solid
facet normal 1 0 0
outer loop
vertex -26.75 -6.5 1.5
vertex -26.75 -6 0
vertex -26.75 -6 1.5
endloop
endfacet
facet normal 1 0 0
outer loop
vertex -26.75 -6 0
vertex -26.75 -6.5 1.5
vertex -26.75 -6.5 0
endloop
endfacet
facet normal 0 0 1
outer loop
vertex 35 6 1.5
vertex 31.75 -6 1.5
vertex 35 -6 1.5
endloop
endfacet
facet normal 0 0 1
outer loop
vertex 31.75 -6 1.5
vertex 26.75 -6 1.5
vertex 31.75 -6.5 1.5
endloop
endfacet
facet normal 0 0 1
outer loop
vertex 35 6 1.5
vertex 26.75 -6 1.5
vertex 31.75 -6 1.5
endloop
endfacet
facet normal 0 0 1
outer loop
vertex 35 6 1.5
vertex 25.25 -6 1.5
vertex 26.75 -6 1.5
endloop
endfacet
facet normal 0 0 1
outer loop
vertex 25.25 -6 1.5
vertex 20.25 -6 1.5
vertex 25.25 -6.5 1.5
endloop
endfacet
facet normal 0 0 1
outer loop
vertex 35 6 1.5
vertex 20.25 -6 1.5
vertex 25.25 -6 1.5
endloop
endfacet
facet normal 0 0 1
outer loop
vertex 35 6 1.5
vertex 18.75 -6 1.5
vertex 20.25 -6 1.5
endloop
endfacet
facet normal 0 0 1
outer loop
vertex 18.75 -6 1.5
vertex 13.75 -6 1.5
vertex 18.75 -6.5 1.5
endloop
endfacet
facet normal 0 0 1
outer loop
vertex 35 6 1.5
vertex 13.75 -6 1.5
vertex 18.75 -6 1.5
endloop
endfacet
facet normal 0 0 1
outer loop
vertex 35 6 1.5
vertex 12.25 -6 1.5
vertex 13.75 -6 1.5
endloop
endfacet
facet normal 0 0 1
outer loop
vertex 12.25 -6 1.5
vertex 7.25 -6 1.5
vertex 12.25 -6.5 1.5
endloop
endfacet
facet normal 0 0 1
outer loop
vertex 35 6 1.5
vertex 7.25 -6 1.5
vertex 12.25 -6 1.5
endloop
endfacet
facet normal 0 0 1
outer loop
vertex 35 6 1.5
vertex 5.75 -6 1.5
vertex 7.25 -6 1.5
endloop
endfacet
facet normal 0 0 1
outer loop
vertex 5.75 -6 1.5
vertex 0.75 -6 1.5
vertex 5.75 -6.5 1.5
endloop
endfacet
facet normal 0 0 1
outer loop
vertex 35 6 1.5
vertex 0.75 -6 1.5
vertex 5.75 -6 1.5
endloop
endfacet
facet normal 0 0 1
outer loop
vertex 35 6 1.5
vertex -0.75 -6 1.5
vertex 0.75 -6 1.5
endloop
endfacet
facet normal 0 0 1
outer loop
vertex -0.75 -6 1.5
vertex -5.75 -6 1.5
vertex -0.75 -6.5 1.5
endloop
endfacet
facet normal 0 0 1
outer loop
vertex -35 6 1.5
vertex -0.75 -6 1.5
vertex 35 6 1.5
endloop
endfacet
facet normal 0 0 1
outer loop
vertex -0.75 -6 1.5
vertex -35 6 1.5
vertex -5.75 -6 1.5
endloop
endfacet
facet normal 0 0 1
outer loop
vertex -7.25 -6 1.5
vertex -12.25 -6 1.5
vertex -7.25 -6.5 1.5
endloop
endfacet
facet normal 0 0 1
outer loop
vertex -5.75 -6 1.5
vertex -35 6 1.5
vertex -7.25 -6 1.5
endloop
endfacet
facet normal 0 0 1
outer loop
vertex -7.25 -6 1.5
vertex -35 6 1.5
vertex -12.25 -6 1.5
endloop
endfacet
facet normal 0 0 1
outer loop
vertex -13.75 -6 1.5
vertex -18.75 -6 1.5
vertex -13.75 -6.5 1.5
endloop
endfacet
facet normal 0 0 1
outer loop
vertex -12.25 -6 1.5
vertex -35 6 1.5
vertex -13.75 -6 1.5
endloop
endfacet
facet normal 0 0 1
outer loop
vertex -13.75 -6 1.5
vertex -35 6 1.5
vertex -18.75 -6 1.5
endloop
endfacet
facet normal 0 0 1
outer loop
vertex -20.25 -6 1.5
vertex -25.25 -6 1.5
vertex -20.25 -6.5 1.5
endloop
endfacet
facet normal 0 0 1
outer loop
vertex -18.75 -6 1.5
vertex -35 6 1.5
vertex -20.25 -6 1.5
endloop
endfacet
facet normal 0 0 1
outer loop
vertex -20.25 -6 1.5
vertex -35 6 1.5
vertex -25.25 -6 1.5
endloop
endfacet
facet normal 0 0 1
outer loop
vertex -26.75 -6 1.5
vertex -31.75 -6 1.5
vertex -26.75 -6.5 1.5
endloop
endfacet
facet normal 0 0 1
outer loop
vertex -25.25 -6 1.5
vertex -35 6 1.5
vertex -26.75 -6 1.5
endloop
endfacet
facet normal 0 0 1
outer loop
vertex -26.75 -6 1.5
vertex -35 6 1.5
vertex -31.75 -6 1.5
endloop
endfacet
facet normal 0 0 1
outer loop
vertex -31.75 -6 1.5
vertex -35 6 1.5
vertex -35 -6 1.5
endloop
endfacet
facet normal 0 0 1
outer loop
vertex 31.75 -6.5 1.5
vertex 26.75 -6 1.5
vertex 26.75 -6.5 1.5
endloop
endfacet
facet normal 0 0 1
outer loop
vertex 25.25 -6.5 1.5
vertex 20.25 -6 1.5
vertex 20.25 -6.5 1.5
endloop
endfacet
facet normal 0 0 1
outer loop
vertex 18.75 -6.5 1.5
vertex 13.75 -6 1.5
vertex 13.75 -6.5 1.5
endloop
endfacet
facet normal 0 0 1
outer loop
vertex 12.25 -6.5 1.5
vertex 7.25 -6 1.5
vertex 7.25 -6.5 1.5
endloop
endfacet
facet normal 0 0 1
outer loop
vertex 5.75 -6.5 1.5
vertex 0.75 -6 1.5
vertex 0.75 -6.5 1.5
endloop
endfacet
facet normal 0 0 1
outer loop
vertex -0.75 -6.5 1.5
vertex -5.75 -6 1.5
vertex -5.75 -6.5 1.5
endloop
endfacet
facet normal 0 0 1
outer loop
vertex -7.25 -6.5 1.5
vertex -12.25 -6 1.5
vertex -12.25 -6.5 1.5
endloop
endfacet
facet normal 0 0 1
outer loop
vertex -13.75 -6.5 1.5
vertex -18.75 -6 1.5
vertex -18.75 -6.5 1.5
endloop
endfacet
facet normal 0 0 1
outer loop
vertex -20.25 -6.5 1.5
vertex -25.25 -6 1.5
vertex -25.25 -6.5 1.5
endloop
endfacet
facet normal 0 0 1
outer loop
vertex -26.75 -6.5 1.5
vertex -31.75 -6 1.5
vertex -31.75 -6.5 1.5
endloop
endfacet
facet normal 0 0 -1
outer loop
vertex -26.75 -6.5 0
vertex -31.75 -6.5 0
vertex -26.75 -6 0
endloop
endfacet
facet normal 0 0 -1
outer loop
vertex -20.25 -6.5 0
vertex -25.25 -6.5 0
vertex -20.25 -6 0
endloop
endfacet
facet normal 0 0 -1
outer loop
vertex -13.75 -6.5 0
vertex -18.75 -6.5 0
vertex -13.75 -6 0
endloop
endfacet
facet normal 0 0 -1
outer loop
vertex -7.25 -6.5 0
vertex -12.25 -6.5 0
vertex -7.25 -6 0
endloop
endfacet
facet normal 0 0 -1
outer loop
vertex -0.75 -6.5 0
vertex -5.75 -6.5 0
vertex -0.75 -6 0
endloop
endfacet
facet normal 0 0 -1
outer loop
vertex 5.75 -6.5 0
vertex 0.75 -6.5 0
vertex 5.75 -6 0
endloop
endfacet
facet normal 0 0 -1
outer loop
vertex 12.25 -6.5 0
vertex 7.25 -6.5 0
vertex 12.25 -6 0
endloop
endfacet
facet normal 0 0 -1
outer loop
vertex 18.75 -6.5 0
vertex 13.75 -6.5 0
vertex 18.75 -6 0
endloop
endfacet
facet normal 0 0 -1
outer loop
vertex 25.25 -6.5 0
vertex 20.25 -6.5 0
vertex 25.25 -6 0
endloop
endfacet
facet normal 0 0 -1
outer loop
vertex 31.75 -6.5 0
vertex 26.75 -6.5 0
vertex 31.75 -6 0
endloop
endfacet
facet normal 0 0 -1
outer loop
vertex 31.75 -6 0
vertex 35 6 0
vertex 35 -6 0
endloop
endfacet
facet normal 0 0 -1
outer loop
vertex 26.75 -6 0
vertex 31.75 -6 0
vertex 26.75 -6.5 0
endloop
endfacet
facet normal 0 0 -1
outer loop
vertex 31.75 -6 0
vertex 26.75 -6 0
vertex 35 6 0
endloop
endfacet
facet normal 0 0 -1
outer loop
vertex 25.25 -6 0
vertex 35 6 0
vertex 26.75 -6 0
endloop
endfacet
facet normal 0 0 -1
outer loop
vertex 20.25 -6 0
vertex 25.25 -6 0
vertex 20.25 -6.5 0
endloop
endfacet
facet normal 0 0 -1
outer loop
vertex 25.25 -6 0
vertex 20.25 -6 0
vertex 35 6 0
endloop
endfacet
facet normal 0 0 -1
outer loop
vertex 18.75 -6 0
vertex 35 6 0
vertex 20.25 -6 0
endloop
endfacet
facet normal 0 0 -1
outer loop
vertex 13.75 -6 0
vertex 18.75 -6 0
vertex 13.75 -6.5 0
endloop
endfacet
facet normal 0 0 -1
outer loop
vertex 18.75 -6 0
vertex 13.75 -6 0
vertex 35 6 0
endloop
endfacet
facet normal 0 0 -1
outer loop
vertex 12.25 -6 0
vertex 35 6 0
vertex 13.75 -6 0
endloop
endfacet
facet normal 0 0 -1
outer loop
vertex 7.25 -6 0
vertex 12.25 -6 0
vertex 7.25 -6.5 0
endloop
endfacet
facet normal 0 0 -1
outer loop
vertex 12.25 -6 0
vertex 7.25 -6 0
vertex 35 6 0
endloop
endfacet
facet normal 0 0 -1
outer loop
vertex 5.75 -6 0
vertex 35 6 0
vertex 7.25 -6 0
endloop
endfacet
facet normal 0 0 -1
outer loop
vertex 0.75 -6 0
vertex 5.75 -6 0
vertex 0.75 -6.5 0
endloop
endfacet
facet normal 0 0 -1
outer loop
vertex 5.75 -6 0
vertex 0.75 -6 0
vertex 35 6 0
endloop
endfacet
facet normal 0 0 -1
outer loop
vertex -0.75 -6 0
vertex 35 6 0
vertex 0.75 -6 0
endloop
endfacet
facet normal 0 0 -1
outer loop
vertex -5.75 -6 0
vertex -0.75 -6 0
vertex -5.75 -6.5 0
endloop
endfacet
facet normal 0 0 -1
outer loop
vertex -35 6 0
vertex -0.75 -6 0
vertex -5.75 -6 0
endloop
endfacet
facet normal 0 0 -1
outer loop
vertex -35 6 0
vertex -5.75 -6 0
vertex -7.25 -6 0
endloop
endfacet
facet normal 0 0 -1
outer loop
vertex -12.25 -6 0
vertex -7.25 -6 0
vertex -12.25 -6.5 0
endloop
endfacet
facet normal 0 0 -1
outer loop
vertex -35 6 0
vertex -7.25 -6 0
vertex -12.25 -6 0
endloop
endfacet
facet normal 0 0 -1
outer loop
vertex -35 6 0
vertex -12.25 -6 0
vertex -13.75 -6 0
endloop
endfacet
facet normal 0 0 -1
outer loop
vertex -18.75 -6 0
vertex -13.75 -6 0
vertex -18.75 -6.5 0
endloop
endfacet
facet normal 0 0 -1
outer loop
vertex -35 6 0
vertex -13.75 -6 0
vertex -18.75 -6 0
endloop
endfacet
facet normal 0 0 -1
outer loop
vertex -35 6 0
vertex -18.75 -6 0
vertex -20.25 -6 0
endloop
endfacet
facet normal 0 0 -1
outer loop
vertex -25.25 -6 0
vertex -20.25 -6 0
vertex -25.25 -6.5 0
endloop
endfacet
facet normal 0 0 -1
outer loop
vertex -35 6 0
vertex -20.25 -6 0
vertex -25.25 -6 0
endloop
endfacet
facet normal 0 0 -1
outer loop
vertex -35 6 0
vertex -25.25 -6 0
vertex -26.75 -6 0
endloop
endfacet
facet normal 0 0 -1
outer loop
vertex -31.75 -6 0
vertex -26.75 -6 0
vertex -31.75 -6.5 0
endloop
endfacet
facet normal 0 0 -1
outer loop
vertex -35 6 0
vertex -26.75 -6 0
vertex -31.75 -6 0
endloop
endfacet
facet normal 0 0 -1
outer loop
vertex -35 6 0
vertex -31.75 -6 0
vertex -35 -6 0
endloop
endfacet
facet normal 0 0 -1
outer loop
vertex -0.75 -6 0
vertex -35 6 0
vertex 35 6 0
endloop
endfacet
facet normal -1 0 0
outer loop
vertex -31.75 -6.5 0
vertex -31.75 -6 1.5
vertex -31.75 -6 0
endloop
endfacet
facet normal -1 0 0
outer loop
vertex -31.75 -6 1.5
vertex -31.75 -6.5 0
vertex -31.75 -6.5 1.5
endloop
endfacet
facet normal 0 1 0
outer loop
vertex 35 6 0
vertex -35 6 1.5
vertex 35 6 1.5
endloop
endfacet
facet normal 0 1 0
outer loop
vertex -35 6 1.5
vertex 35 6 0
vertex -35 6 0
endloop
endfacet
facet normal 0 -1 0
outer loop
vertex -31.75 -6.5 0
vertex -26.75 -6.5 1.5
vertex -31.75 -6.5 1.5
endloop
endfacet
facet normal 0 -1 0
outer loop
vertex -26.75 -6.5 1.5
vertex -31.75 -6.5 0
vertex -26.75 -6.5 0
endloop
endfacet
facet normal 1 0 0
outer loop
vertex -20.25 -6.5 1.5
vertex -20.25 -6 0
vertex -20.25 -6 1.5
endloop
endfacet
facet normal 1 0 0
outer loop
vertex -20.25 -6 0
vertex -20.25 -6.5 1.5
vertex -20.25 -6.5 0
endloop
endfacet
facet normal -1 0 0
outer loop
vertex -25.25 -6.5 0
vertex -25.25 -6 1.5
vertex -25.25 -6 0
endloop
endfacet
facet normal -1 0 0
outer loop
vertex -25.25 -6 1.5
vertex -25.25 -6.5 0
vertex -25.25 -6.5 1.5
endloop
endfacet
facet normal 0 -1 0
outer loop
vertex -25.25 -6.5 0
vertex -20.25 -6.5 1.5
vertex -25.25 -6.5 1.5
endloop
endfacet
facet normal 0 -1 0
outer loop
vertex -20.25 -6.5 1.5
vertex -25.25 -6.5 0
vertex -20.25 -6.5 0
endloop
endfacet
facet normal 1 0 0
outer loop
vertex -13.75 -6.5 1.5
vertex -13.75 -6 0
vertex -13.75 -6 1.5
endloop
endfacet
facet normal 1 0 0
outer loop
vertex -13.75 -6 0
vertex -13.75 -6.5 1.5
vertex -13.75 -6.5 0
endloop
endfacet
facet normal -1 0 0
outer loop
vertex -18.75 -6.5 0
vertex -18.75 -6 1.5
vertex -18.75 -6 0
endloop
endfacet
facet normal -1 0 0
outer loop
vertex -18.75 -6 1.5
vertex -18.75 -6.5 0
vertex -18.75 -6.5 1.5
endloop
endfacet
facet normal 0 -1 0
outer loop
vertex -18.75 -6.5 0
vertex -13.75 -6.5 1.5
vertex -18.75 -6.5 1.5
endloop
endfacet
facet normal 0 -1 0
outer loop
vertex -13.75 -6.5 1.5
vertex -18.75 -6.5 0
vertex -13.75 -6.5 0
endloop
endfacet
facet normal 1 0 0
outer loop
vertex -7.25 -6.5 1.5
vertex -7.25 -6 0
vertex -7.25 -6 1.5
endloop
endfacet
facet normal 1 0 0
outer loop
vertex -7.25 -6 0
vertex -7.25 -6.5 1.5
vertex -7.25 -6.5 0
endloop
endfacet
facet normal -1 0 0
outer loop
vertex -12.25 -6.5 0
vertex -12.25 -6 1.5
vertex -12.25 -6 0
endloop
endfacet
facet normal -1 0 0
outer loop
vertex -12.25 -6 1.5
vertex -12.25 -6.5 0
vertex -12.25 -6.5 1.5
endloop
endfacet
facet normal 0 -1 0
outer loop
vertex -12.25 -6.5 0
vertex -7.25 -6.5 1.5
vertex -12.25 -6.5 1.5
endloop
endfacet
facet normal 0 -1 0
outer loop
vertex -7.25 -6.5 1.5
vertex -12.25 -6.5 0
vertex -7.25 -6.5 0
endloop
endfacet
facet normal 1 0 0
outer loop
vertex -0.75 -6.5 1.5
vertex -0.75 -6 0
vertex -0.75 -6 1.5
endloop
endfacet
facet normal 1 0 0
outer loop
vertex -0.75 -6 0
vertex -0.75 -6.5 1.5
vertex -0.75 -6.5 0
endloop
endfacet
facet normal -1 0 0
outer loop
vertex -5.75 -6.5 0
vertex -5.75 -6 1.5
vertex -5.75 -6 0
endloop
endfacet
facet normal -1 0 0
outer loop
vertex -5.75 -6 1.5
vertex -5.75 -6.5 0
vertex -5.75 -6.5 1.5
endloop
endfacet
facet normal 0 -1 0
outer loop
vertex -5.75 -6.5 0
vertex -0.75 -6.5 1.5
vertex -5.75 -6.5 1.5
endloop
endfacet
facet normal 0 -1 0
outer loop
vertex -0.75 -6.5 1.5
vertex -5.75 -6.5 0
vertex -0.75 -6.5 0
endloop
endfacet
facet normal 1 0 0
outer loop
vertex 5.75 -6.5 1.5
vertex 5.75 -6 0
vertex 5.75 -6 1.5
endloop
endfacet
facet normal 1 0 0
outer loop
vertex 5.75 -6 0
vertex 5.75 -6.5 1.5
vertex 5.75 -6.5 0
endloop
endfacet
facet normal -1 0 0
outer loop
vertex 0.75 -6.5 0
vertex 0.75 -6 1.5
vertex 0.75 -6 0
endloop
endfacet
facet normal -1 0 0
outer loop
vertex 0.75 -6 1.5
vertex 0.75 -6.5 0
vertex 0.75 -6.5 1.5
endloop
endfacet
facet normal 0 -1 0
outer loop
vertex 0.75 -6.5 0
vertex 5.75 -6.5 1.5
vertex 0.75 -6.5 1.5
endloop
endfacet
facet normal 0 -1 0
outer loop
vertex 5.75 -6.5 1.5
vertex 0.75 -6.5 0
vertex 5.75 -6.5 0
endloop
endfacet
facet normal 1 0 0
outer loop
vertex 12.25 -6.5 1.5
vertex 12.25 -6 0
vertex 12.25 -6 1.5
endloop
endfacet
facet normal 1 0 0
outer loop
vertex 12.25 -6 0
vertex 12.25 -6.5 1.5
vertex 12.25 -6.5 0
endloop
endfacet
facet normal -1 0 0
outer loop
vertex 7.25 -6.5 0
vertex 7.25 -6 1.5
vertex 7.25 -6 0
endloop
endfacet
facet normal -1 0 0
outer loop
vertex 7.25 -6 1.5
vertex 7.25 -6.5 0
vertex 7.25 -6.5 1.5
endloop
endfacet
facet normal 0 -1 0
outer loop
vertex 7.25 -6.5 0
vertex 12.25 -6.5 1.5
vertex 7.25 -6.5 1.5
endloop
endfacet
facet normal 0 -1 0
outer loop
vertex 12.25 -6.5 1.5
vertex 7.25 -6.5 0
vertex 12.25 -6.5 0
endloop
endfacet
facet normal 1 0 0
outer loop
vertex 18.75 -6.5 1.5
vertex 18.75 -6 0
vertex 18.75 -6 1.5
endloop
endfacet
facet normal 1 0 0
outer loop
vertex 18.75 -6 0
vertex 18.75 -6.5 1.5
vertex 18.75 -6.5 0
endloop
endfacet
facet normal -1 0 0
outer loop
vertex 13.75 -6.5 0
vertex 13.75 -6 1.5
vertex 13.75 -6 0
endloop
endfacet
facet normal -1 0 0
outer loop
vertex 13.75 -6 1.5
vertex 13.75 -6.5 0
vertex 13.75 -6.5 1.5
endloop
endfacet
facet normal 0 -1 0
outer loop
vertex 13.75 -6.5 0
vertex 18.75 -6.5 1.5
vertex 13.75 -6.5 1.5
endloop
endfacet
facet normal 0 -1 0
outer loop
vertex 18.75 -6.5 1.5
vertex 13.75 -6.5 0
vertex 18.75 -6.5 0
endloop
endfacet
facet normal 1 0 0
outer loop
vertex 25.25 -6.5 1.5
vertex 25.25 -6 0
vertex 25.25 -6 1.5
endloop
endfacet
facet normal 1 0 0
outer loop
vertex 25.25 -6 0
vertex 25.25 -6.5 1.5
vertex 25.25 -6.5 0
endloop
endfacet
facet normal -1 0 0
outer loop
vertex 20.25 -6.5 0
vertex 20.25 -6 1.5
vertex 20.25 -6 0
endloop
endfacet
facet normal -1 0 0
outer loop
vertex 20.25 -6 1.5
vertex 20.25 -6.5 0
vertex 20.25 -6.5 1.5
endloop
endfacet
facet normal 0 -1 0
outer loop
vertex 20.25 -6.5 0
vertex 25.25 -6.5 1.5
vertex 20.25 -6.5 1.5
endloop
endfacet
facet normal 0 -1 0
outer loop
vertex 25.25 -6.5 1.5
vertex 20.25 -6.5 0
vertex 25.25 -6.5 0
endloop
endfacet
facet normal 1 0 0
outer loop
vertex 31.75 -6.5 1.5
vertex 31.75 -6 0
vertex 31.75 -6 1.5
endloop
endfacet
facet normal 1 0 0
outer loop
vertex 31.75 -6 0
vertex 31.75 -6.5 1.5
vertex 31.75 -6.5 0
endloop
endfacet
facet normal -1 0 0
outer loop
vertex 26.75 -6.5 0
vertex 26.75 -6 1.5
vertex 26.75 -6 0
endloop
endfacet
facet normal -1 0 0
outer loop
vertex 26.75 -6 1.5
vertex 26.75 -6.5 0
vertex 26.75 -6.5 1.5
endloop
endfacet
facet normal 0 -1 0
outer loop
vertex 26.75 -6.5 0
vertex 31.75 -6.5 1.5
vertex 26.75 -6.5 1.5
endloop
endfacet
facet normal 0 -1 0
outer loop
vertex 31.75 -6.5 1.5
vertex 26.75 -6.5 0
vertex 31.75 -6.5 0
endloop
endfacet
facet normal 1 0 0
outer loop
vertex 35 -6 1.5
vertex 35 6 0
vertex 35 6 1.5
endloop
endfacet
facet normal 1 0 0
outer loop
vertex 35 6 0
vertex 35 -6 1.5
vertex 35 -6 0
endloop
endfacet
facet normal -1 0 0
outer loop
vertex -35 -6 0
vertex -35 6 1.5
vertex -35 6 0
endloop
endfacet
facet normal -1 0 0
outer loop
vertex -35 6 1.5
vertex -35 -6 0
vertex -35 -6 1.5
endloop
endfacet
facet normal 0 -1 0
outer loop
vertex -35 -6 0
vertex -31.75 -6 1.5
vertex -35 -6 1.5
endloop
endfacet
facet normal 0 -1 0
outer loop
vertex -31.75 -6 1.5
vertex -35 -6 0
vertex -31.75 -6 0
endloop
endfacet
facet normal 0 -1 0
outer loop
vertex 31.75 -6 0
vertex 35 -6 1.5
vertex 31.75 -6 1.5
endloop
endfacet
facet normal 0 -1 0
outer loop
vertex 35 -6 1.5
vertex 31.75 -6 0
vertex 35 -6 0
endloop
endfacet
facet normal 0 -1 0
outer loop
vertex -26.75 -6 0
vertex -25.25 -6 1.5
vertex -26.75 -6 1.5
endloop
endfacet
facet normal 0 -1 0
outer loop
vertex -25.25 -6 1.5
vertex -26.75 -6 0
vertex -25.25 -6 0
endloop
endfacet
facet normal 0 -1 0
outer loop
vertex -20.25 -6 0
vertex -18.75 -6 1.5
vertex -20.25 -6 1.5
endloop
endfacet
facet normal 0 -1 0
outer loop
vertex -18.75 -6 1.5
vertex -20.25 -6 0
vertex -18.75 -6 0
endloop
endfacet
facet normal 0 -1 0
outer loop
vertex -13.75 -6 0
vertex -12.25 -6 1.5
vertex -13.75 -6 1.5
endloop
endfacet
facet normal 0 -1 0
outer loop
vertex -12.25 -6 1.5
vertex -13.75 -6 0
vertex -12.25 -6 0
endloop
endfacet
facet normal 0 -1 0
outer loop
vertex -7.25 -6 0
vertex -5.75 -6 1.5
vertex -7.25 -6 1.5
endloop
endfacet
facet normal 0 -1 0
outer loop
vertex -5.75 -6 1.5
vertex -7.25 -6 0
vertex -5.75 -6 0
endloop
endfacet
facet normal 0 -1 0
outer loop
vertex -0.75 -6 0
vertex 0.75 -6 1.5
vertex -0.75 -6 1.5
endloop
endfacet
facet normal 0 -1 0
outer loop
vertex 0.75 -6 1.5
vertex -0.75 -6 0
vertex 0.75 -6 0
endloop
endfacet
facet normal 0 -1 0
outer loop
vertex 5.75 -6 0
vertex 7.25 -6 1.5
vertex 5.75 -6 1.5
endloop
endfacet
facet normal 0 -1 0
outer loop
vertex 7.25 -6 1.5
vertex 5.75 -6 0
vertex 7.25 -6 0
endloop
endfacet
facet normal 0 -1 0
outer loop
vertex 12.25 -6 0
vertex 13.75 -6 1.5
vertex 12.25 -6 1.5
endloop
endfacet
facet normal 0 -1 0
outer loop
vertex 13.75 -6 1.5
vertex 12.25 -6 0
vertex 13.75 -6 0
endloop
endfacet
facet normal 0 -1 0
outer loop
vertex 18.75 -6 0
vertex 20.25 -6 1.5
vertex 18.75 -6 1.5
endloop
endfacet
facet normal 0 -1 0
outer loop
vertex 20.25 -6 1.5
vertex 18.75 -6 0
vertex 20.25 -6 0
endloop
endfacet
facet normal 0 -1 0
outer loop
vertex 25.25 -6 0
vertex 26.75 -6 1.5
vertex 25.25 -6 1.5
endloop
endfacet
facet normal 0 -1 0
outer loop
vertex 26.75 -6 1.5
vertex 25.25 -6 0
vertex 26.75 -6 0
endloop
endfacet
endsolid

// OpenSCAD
// 10-well comb for casting agarose gels
// Print orientation: flat on bed, teeth pointing down (-Y)

// ---- Dimensions (mm) ----
plate_t      = 1.5;   // plate thickness (Z)
spine_l      = 70;    // spine length (X)
spine_w      = 12;    // spine width (Y)
tooth_w      = 5.0;   // tooth width (X)
tooth_l      = 12;    // tooth length (Y)
tooth_count  = 10;    // number of teeth
gap          = 1.5;   // gap between teeth (X)
embed        = 0.5;   // tooth overlap into spine for a clean union

// ---- Derived ----
pitch   = tooth_w + gap;            // centre-to-centre spacing
x_start = -(tooth_count - 1) * pitch / 2;  // first tooth centre (row centred)

// ---- Model ----
union() {
    // Spine (back bar)
    translate([-spine_l / 2, -spine_w / 2, 0])
        cube([spine_l, spine_w, plate_t]);

    // Teeth hanging in -Y
    for (i = [0 : tooth_count - 1])
        translate([x_start + i * pitch - tooth_w / 2,
                   -spine_w / 2 - embed,
                   0])
            cube([tooth_w, tooth_l + embed, plate_t]);
}
